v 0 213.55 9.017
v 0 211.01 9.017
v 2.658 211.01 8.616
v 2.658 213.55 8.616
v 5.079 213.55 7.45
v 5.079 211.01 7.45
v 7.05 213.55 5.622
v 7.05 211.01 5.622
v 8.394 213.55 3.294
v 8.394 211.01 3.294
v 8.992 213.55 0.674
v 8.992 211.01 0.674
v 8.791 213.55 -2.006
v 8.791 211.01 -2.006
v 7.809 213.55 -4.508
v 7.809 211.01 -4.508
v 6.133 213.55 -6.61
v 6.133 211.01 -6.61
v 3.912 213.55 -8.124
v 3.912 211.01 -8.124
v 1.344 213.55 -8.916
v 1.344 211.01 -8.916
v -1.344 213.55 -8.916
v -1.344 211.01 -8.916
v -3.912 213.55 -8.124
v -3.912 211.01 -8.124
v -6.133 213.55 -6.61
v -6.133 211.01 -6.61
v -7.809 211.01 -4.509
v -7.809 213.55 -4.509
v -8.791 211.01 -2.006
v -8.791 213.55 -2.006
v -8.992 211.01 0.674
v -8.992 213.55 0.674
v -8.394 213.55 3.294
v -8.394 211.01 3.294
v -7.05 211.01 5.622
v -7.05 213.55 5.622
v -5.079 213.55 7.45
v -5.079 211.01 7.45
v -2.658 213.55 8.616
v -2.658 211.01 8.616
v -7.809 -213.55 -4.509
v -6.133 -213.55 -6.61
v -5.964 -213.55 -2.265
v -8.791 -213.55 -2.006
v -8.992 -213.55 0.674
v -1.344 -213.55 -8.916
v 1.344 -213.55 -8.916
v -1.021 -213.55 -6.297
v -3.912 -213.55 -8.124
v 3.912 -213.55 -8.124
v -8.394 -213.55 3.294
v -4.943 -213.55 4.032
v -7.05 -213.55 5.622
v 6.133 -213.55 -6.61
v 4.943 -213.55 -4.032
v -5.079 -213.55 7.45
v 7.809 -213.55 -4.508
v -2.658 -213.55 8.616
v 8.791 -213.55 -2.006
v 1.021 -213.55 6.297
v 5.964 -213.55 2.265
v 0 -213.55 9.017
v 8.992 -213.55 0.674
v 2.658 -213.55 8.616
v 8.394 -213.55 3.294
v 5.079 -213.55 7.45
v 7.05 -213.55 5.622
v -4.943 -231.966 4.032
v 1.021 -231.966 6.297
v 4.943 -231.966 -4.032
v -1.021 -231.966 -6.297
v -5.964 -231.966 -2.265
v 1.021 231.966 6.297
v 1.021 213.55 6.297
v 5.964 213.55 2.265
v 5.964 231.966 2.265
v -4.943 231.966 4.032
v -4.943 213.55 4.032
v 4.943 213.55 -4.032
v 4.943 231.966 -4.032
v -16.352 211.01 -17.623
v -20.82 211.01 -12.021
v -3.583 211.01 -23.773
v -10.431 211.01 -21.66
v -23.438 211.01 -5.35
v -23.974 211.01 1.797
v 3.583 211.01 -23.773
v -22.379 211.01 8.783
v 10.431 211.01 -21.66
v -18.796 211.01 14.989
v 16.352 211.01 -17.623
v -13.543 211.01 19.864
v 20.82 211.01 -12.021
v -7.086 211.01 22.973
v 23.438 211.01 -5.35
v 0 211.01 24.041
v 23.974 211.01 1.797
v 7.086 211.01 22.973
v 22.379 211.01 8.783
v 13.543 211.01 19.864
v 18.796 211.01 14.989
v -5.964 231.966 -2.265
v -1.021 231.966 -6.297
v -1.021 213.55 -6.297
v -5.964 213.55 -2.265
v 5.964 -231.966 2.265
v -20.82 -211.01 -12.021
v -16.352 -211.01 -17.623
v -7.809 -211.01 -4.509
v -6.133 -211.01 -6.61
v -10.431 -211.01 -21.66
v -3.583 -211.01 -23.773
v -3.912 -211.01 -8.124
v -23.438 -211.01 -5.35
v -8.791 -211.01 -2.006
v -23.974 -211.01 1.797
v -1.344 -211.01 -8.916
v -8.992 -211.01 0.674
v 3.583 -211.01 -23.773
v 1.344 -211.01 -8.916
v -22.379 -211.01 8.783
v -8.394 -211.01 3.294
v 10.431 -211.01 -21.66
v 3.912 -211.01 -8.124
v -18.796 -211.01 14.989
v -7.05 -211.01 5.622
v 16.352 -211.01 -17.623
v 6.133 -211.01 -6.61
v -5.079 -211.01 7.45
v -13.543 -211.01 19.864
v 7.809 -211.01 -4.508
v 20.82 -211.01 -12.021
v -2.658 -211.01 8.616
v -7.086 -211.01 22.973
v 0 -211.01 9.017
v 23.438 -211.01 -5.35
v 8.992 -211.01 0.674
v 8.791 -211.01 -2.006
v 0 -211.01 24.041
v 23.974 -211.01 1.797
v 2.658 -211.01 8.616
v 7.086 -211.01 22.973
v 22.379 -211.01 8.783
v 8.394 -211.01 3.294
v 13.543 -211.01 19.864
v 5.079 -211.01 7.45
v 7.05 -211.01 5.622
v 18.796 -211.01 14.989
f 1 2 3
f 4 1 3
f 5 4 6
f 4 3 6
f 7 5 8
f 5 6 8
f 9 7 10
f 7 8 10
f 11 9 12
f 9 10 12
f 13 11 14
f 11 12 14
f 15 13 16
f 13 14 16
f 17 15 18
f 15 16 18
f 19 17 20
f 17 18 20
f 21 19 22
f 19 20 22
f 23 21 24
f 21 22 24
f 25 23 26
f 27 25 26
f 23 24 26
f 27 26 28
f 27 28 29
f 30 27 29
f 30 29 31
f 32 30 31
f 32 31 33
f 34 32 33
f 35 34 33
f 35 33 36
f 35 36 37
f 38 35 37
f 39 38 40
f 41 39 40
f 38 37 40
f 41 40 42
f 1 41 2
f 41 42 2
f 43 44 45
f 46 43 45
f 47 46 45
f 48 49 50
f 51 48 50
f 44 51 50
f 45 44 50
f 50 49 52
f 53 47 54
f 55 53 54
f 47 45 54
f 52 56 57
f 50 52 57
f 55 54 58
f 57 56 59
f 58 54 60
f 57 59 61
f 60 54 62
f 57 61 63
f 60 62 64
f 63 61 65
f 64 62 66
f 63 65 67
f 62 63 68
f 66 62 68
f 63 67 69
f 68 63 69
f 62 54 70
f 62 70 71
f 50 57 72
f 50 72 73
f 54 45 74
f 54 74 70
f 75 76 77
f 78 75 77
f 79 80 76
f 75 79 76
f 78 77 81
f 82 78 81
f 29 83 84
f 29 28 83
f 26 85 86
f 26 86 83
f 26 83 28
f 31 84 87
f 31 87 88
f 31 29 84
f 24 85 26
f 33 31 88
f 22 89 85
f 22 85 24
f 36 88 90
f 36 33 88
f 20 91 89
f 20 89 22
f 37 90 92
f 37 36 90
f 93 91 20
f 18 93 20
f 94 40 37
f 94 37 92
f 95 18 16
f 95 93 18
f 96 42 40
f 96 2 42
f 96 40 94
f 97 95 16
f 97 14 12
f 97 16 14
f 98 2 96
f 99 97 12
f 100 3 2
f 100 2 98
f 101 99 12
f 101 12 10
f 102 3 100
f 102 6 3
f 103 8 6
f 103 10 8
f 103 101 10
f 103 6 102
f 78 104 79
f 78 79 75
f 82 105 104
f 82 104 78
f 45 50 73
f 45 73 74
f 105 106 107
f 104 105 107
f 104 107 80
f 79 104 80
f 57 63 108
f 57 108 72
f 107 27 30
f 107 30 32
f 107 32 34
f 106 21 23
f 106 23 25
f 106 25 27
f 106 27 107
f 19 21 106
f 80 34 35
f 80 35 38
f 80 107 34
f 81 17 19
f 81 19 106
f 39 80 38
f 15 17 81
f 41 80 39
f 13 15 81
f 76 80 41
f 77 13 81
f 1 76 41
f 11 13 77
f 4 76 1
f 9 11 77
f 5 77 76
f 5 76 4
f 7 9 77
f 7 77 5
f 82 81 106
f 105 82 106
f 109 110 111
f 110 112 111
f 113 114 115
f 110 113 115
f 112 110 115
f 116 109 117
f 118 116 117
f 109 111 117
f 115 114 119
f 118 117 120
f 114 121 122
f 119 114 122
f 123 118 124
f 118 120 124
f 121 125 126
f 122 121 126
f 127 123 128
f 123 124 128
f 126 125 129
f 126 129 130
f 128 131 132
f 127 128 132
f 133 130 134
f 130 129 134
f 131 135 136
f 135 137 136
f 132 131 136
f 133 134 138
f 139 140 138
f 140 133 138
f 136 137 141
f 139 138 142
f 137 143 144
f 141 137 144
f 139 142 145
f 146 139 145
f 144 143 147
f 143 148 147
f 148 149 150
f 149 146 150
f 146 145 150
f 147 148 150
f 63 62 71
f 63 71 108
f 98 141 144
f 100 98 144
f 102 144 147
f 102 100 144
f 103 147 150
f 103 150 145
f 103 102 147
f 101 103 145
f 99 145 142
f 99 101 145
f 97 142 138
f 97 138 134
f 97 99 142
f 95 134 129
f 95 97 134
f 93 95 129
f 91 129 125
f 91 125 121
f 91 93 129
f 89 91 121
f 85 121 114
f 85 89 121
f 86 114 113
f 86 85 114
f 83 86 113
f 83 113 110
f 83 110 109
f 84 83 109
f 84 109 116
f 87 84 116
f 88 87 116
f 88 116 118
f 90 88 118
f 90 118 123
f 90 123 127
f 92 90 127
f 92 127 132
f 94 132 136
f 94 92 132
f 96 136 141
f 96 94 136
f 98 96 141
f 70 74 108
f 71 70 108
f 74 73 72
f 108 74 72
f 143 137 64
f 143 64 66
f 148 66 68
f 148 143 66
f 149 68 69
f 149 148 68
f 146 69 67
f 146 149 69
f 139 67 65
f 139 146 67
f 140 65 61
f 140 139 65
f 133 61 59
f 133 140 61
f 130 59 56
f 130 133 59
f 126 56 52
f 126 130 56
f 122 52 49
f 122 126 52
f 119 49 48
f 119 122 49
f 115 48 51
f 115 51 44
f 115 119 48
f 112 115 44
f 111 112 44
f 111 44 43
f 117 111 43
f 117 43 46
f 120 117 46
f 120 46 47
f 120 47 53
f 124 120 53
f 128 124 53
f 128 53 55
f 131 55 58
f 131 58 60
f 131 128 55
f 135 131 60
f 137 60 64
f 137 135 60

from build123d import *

# Parameters (mm, degrees)
SKETCH1_R           = 24.0411
BOSS_EXTRUDE1_DEPTH = 211.0105
SKETCH2_R           = 9.017
BOSS_EXTRUDE2_DEPTH = 2.54
BOSS_EXTRUDE3_DEPTH = 18.415


with BuildPart() as part:
    # Sketch1 → Boss-Extrude1 (new body)
    with BuildSketch(Plane(origin=(0, 0, 0), x_dir=(1, 0, 0), z_dir=(0, 1, 0))):
        with Locations(Location((0, 0, 0), (0, 0, 270))):
            Circle(SKETCH1_R)
    boss_extrude1 = extrude(amount=BOSS_EXTRUDE1_DEPTH)

    # Sketch2 → Boss-Extrude2 (add)
    with BuildSketch(Plane(origin=(0, 211.0105, 0), x_dir=(1, 0, 0), z_dir=(0, 1, 0))):
        with Locations(Location((0, 0, 0), (0, 0, 270))):
            Circle(SKETCH2_R)
    boss_extrude2 = extrude(amount=BOSS_EXTRUDE2_DEPTH)

    # Sketch3 → Boss-Extrude3 (add)
    with BuildSketch(Plane(origin=(0, 213.5505, 0), x_dir=(1, 0, 0), z_dir=(0, 1, 0))):
        Polygon((5.963677607, -2.264512398), (4.942964068, 4.032440108), (-1.020713539, 6.296952507), (-5.963677607, 2.264512398), (-4.942964068, -4.032440108), (1.020713539, -6.296952507), align=None)
    boss_extrude3 = extrude(amount=BOSS_EXTRUDE3_DEPTH)

    # Mirror1: Boss-Extrude1, Boss-Extrude2, Boss-Extrude3 across plane
    add(boss_extrude1.mirror(Plane.ZX))
    add(boss_extrude2.mirror(Plane.ZX))
    add(boss_extrude3.mirror(Plane.ZX))


solid = part.part
